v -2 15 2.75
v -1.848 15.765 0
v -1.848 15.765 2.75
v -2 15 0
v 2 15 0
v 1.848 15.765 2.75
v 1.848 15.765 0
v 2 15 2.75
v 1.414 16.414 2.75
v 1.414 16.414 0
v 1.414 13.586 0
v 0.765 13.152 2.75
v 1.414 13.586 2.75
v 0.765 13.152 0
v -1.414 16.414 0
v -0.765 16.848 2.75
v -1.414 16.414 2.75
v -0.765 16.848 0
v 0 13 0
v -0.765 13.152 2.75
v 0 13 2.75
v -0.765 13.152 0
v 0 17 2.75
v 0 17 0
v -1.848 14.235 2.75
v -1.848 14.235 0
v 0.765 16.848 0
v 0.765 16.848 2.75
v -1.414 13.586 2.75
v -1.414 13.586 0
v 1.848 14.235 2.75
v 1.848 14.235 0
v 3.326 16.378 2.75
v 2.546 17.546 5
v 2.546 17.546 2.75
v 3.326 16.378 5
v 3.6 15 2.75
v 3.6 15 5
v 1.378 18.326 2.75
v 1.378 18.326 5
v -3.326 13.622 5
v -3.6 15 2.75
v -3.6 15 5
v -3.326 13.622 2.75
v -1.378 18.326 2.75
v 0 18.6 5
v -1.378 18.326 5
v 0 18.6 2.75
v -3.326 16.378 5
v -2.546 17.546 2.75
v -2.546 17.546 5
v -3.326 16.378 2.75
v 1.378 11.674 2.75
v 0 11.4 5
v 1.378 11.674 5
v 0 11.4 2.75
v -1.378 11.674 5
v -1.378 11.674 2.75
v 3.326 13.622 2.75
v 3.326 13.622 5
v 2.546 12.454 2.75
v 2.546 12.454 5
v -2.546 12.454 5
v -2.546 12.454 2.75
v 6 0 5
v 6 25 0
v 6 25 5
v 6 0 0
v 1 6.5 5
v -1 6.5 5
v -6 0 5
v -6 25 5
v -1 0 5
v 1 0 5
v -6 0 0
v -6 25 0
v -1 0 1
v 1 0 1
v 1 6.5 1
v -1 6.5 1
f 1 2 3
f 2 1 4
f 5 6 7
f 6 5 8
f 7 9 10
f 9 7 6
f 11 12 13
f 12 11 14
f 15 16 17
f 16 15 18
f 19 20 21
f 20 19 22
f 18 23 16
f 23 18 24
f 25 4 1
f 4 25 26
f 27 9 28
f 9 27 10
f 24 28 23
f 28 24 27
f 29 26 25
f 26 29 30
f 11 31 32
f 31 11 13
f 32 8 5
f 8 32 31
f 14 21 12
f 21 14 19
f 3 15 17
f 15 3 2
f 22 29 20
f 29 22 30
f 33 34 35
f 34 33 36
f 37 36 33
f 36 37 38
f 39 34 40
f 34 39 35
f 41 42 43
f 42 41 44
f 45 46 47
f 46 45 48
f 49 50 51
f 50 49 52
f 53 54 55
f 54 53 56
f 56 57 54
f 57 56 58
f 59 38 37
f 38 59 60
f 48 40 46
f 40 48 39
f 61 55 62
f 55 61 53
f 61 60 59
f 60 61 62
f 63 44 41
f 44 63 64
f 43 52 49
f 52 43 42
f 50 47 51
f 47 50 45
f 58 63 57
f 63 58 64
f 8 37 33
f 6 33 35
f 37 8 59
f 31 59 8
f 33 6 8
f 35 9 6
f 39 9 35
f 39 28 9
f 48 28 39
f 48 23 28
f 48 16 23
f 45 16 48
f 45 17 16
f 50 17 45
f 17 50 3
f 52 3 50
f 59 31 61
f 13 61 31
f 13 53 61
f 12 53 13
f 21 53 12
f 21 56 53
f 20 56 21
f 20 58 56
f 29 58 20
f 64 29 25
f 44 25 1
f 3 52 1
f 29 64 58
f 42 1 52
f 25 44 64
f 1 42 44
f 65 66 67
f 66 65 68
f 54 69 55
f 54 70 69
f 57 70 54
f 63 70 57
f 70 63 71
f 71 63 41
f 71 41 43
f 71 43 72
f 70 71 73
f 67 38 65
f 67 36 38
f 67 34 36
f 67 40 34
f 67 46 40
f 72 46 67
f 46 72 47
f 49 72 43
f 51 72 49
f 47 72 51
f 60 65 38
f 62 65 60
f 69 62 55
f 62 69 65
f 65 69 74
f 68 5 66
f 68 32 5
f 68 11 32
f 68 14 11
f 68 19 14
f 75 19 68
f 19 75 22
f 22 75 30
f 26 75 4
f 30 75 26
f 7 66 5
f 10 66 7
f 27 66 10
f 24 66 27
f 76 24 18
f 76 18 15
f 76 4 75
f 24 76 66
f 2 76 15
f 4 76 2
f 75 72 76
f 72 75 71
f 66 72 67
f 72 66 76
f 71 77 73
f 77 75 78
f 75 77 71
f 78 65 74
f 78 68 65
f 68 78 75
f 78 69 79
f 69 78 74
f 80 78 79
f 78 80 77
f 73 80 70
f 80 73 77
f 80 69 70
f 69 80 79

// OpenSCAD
module screw (x, y)
{
  translate ([x, y, 0]) {
    cylinder (h=10, d=4.0, $fn=16, center=true);
  }
  translate ([x, y, 5]) {
    cylinder (h=4.5, d=7.2, $fn=16, center=true);
  }
}

translate ([-6, 0, 0]) {
  difference () {
    
    // Floor
    cube ([12, 25, 5]);

    // Slot
    translate ([5, 0, 1]) {
      cube ([2, 6.5, 4]);
    }
    
    //  Screw hole & head recess
    screw (6, 15);
  } 
}
